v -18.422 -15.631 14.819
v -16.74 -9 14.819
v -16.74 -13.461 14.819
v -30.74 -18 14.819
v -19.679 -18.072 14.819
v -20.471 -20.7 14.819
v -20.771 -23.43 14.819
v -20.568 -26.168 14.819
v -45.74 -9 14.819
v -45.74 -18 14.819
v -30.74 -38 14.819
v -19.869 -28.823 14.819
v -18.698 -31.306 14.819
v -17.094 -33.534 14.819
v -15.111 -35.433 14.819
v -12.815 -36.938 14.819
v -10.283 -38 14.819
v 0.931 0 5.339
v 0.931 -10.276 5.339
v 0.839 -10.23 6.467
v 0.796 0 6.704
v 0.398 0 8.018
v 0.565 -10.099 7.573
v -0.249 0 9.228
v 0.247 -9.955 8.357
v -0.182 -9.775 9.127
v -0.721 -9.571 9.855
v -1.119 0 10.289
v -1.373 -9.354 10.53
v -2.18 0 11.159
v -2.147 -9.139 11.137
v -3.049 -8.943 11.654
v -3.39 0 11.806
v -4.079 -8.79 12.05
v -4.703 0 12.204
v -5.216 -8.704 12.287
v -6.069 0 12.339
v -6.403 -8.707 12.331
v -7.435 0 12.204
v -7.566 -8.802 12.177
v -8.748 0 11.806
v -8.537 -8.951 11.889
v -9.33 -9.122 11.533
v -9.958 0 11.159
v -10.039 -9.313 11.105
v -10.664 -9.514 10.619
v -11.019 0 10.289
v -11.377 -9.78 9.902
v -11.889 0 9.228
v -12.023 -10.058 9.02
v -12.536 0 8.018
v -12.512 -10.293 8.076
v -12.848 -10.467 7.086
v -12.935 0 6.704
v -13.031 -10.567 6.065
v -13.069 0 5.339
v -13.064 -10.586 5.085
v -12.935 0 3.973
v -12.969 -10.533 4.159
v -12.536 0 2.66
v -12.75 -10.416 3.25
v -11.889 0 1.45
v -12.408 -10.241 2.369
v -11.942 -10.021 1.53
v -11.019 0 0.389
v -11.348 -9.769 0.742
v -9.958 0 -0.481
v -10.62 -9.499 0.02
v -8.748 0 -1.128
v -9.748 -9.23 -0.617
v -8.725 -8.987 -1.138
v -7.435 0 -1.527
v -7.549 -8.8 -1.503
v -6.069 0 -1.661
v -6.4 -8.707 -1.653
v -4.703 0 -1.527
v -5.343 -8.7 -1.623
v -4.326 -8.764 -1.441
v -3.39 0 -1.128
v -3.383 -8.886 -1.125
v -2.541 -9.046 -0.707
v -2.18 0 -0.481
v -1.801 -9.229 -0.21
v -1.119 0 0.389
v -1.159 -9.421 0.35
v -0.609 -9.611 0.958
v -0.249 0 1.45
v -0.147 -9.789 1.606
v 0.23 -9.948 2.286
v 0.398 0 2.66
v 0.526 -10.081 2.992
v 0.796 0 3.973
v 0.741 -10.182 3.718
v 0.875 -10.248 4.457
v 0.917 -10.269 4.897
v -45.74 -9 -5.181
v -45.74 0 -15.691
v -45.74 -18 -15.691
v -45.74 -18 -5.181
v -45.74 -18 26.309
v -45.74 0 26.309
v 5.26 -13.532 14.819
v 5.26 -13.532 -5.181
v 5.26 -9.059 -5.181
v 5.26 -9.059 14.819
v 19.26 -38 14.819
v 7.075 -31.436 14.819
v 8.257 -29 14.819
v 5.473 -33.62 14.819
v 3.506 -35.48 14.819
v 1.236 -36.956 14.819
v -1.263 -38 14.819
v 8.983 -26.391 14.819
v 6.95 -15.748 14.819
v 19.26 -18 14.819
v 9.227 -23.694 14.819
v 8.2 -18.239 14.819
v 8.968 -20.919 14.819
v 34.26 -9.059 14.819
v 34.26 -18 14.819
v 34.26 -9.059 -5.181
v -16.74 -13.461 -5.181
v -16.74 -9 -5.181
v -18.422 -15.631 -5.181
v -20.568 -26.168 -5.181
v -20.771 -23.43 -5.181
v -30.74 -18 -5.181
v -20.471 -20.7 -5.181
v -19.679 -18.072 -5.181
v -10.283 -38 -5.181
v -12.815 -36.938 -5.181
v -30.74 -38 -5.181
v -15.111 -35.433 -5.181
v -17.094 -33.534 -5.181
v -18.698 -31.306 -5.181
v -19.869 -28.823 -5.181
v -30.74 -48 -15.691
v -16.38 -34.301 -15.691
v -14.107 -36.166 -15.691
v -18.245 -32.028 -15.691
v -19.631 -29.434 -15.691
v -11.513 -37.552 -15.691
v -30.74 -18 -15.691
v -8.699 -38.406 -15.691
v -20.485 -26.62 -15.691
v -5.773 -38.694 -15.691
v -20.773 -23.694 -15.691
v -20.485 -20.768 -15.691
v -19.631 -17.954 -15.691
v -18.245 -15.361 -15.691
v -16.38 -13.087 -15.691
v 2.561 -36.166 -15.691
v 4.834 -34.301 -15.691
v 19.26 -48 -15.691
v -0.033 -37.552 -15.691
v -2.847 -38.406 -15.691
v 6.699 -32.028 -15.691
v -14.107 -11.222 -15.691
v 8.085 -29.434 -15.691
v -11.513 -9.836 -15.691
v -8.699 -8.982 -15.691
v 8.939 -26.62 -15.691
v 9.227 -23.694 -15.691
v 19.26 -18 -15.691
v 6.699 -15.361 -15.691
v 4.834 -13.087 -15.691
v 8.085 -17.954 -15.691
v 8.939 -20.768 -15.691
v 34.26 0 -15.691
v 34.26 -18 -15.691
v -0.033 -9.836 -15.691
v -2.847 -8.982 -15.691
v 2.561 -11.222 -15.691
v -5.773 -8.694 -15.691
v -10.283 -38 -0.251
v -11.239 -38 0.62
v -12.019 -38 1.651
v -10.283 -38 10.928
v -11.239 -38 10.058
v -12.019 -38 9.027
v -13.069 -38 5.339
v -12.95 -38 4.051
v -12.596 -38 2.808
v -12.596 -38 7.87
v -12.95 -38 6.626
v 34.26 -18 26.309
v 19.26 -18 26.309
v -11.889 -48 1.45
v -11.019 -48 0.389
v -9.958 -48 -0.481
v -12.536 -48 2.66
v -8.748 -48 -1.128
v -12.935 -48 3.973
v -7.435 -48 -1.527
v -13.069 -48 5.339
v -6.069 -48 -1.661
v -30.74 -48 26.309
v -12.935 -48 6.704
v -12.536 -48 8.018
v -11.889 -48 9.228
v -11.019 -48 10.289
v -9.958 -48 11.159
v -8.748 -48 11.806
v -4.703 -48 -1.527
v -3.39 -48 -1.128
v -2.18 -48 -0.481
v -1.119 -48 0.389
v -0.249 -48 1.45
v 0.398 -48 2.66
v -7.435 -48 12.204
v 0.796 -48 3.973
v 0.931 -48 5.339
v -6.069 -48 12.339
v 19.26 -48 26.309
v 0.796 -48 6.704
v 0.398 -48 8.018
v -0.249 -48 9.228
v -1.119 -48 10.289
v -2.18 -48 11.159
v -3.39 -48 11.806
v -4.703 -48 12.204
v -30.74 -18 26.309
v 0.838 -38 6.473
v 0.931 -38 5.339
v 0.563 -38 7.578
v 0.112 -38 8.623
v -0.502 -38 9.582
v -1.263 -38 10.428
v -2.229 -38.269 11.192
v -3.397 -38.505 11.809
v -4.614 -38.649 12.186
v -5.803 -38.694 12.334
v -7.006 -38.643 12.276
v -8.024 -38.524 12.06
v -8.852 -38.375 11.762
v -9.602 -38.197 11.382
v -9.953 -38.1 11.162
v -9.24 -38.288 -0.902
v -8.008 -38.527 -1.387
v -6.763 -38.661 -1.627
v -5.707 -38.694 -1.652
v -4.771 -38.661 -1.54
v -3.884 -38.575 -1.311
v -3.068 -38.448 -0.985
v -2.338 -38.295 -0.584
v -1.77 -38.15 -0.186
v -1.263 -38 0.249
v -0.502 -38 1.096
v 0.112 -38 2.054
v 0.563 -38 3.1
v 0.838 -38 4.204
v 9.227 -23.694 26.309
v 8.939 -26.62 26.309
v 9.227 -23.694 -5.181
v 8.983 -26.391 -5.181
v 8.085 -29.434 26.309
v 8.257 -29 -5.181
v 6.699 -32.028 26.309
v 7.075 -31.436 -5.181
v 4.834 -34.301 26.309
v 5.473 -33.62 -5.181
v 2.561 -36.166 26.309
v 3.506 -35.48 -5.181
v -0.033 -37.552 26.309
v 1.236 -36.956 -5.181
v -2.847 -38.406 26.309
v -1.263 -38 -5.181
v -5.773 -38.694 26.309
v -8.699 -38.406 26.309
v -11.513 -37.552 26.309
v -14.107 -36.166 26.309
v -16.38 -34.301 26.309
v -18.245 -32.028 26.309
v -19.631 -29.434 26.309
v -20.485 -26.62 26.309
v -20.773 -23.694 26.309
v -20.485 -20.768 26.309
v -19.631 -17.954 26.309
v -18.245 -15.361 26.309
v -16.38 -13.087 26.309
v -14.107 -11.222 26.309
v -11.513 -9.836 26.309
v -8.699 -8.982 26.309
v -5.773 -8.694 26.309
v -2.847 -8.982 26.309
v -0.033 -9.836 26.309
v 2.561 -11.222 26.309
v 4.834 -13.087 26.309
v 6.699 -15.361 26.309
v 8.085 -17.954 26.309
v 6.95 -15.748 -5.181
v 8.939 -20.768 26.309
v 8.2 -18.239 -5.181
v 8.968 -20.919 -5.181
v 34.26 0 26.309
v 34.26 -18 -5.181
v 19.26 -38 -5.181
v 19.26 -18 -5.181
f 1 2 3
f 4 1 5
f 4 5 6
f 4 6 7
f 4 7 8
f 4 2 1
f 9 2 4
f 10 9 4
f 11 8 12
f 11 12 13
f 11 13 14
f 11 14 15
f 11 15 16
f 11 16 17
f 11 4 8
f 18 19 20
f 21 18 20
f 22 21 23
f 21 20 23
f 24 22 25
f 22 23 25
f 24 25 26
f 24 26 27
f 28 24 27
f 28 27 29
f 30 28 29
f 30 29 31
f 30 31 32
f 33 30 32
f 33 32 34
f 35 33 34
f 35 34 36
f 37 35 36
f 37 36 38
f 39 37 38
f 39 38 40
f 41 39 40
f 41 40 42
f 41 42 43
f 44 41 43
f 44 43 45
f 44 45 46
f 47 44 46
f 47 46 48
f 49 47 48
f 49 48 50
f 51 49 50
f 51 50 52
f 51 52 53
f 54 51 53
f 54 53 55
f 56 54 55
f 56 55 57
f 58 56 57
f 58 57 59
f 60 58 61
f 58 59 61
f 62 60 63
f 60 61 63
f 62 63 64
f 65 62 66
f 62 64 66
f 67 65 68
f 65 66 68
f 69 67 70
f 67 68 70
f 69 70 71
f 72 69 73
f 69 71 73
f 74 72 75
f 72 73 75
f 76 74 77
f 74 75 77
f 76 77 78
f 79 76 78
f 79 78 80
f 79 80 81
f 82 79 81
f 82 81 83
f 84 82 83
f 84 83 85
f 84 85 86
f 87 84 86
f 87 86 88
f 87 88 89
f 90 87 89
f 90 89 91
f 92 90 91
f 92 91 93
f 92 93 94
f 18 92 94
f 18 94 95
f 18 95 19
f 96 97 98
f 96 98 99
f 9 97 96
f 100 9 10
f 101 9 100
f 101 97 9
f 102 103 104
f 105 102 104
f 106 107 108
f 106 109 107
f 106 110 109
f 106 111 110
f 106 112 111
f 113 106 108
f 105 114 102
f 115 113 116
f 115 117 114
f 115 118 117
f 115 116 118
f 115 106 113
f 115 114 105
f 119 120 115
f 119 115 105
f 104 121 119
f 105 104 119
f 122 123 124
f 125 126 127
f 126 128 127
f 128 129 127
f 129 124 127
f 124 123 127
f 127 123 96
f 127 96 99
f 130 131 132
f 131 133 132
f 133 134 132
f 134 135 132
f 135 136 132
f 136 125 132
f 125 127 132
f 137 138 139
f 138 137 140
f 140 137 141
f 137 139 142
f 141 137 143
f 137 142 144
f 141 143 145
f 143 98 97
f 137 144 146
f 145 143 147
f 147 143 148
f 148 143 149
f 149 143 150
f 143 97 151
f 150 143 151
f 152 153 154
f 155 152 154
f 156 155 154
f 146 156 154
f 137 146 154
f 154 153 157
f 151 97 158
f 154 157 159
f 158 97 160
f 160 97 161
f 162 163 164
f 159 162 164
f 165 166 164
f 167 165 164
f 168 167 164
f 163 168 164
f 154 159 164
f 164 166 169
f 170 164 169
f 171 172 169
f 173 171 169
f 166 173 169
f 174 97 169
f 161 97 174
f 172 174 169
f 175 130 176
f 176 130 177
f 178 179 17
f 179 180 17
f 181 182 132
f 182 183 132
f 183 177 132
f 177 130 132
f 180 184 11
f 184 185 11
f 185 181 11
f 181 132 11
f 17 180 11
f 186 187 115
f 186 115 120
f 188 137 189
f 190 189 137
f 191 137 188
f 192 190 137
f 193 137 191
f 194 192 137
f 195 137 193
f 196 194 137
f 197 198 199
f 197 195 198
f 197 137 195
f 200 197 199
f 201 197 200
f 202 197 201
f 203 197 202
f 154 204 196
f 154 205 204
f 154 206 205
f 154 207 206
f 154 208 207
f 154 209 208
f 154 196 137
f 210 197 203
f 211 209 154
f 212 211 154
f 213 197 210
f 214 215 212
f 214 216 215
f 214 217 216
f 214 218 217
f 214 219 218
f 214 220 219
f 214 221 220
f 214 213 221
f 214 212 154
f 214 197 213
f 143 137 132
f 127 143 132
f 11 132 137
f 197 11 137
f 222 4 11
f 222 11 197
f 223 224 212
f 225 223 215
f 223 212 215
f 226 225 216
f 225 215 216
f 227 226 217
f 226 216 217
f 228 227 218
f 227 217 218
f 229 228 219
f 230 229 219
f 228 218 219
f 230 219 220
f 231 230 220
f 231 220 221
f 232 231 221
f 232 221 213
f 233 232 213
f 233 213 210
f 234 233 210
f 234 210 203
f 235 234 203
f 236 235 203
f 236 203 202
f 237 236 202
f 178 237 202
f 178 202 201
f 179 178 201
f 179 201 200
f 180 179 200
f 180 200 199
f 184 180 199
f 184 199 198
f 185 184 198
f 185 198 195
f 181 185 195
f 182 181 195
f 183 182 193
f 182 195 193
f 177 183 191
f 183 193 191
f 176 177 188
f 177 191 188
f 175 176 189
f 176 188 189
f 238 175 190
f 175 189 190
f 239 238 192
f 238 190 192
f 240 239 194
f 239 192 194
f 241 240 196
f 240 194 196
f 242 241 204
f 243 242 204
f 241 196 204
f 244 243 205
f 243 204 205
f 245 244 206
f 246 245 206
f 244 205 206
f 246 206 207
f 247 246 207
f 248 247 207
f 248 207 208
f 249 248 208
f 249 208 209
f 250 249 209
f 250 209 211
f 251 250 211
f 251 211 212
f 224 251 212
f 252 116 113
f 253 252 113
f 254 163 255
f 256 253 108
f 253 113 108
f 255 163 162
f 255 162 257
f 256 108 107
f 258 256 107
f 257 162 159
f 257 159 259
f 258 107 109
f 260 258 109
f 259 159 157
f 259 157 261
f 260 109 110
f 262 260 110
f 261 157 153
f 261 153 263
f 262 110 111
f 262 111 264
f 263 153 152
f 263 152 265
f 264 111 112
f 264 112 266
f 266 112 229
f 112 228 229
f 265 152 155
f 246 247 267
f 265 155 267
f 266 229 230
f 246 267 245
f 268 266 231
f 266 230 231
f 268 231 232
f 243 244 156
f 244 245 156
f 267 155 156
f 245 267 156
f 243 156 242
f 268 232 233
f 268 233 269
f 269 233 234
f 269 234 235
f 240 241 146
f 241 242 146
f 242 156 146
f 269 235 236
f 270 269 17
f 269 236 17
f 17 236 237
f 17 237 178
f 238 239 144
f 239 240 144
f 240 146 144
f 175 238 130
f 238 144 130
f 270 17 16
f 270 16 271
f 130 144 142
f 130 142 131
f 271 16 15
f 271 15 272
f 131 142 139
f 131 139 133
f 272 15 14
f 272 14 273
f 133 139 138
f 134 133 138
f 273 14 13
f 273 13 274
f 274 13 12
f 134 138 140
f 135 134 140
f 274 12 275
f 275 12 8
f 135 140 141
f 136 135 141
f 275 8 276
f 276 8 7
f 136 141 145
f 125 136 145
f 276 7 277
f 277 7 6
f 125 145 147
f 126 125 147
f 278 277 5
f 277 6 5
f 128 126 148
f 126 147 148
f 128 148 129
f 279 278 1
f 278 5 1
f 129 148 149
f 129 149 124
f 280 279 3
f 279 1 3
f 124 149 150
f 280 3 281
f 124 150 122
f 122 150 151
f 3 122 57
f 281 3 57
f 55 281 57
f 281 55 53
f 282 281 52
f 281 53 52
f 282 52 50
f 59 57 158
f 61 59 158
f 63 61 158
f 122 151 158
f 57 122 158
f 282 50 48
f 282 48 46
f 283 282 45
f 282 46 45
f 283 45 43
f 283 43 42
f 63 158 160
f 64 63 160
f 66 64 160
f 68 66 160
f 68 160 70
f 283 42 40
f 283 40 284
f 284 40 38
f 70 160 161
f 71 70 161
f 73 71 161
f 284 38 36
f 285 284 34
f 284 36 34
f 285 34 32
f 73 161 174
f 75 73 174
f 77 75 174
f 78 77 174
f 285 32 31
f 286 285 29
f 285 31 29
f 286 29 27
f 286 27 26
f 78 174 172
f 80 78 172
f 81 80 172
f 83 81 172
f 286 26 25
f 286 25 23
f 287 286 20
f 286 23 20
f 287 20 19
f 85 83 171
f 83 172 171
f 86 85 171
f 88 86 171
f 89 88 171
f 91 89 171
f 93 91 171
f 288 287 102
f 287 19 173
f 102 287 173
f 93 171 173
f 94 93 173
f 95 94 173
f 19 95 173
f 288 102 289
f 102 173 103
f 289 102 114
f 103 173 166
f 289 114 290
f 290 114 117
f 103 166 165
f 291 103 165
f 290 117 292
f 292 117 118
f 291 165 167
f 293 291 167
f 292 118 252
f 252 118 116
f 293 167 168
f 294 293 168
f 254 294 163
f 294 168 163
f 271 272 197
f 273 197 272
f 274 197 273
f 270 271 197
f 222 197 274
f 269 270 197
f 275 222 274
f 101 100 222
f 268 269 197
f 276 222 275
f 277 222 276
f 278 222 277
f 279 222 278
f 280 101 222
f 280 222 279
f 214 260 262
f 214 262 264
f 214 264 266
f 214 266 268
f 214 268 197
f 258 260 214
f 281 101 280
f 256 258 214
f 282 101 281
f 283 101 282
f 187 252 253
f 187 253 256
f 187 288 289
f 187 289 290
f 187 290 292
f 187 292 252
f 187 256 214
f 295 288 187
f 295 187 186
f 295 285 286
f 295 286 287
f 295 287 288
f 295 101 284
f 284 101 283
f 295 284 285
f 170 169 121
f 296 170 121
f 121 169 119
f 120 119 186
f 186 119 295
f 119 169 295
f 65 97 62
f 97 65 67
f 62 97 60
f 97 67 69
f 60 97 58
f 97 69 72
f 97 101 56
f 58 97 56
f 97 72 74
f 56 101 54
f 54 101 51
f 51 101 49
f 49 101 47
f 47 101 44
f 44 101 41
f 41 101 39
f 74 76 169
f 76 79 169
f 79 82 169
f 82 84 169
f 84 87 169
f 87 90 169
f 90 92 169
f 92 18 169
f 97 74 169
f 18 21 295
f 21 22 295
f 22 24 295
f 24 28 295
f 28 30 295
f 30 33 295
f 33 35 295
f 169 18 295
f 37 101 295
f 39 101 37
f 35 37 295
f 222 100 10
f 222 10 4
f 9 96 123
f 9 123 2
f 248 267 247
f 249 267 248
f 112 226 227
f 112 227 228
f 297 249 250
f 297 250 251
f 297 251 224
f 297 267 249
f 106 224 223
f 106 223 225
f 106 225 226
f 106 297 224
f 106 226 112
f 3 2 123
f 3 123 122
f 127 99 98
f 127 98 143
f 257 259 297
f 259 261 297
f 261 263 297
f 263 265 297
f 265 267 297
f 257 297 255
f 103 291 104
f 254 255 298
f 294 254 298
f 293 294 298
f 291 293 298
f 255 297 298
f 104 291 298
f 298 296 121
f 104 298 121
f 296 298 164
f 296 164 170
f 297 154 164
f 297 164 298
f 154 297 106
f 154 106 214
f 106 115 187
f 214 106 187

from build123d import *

# Parameters (mm, degrees)
F0_W      = 80
F0_H      = 42
F1_DEPTH  = 18
F2_W      = 50
F2_H      = 42
F3_DEPTH  = 30
F4_R      = 7
F5_DEPTH  = 48
F6_R      = 15
F7_DEPTH  = 42
F9_W      = 8.9407891482
F9_H      = 20
F10_DEPTH = 29
F11_W     = 20
F11_H     = 20
F12_DEPTH = 29
F13_W     = 20
F13_H     = 20
F14_DEPTH = 29
F15_W     = 9
F15_H     = 20
F16_DEPTH = 29


with BuildPart() as f1:
    # F0 (on Front) → F1 (new body)
    with BuildSketch(Plane.XZ):
        with Locations((-5.7401350141, 5.3092095107)):
            Rectangle(F0_W, F0_H)
    extrude(amount=F1_DEPTH)

    # F2 (on face) → F3 (join)
    with BuildSketch(Plane.XZ.offset(18)):
        with Locations((-5.7401350141, 5.3092095107)):
            Rectangle(F2_W, F2_H)
    extrude(amount=F3_DEPTH)

    # F4 (on face) → F5 (cut)
    with BuildSketch(Plane.XZ.offset(48)):
        with Locations((-6.0690785758, 5.3388164379)):
            Circle(F4_R)
    extrude(amount=-F5_DEPTH, mode=Mode.SUBTRACT)

    # F6 (on face) → F7 (cut)
    with BuildSketch(Plane(origin=(0, 0, -15.6907904893), x_dir=(1, 0, 0), z_dir=(0, 0, -1))):
        with Locations((-5.7730260305, 23.694081232)):
            Circle(F6_R)
    extrude(amount=-F7_DEPTH, mode=Mode.SUBTRACT)

    # F9 (on face) → F10 (cut)
    with BuildSketch(Plane.YZ.offset(34.2598649859)):
        with Locations((-13.5296054259, 4.8190790601)):
            Rectangle(F9_W, F9_H)
    extrude(amount=-F10_DEPTH, mode=Mode.SUBTRACT)

    # F11 (on face) → F12 (cut)
    with BuildSketch(Plane.YZ.offset(19.2598649859)):
        with Locations((-28, 4.8190790601)):
            Rectangle(F11_W, F11_H)
    extrude(amount=-F12_DEPTH, mode=Mode.SUBTRACT)

    # F13 (on face) → F14 (cut)
    with BuildSketch(Plane(origin=(-30.7401350141, 0, 0), x_dir=(0, -1, 0), z_dir=(-1, 0, 0))):
        with Locations((28, 4.8190776631)):
            Rectangle(F13_W, F13_H)
    extrude(amount=-F14_DEPTH, mode=Mode.SUBTRACT)

    # F15 (on face) → F16 (cut)
    with BuildSketch(Plane(origin=(-45.7401350141, 0, 0), x_dir=(0, -1, 0), z_dir=(-1, 0, 0))):
        with Locations((13.5, 4.8190776631)):
            Rectangle(F15_W, F15_H)
    extrude(amount=-F16_DEPTH, mode=Mode.SUBTRACT)


solid = f1.part
